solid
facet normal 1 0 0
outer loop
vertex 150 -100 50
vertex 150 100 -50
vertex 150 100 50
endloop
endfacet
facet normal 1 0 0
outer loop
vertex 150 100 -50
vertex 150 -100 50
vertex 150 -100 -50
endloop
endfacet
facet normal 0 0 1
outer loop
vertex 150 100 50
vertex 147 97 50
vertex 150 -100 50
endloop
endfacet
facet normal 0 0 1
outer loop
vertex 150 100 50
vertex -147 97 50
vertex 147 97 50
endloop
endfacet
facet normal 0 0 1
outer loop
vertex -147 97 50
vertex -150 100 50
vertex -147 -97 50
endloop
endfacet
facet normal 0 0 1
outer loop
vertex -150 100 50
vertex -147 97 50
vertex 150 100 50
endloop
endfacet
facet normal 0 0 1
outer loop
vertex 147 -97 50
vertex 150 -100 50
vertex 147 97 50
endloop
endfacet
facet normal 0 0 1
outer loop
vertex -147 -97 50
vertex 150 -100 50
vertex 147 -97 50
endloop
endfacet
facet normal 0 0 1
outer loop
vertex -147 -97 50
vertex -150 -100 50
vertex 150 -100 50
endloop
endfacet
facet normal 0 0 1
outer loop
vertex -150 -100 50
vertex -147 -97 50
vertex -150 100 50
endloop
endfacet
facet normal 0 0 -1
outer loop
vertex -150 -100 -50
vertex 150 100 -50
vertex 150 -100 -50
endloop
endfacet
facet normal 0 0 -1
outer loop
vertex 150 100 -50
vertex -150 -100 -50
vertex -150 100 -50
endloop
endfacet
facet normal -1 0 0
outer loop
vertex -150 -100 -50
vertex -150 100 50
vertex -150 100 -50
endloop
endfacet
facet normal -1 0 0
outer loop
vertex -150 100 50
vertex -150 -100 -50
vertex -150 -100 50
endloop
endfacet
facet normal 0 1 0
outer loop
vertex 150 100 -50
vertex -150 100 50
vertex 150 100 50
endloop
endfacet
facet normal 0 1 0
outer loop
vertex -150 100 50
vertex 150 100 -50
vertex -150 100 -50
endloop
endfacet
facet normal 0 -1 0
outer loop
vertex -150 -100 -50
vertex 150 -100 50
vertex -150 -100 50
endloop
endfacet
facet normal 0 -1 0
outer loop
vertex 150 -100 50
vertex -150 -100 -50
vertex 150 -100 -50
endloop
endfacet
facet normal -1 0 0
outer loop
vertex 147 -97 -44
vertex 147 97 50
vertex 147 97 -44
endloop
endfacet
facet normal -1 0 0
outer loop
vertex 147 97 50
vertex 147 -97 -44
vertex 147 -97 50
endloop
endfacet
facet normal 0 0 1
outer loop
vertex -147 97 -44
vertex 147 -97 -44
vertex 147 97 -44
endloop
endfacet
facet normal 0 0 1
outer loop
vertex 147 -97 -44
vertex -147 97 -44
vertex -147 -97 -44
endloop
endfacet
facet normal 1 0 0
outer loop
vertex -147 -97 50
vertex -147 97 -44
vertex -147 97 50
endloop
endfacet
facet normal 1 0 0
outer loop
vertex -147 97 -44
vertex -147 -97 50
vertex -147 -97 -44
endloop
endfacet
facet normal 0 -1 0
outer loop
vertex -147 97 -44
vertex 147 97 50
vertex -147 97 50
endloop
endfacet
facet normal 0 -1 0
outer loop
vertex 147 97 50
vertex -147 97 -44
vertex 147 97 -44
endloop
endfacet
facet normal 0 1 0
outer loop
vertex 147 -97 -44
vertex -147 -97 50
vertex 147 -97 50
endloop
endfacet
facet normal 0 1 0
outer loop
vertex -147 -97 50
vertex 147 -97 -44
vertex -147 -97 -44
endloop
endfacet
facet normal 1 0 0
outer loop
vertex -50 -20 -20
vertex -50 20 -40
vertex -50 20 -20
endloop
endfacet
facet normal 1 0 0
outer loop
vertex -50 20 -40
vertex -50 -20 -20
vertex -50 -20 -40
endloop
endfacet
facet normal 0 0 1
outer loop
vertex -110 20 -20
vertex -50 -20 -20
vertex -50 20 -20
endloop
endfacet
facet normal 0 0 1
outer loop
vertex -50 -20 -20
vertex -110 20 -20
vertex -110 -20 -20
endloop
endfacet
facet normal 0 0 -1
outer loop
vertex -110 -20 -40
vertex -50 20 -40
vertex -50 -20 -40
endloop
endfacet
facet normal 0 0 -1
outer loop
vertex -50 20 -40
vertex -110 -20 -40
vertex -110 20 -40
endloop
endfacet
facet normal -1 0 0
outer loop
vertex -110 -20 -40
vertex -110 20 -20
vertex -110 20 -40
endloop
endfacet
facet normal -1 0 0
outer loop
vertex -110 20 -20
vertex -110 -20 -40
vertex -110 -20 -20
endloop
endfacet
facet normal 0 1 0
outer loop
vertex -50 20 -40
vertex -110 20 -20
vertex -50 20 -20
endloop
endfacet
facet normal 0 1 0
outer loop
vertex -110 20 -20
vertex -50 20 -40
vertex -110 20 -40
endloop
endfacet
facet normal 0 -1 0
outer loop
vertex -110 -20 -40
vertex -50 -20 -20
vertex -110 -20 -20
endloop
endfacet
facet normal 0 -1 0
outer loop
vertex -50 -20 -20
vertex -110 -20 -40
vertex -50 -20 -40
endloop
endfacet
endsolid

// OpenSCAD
// LAMP-ДНК-Экспресс — Кейс
$fn = 64;
module case_body() {
    difference() {
        cube([300,200,100], center=true);
        translate([0,0,3]) cube([294,194,94], center=true);
    }
}
module heater_block() {
    color([0.8,0.2,0.2])
    cube([60,40,20], center=true);
}
module assembly() {
    case_body();
    translate([-80,0,-30]) heater_block();
}
assembly();
